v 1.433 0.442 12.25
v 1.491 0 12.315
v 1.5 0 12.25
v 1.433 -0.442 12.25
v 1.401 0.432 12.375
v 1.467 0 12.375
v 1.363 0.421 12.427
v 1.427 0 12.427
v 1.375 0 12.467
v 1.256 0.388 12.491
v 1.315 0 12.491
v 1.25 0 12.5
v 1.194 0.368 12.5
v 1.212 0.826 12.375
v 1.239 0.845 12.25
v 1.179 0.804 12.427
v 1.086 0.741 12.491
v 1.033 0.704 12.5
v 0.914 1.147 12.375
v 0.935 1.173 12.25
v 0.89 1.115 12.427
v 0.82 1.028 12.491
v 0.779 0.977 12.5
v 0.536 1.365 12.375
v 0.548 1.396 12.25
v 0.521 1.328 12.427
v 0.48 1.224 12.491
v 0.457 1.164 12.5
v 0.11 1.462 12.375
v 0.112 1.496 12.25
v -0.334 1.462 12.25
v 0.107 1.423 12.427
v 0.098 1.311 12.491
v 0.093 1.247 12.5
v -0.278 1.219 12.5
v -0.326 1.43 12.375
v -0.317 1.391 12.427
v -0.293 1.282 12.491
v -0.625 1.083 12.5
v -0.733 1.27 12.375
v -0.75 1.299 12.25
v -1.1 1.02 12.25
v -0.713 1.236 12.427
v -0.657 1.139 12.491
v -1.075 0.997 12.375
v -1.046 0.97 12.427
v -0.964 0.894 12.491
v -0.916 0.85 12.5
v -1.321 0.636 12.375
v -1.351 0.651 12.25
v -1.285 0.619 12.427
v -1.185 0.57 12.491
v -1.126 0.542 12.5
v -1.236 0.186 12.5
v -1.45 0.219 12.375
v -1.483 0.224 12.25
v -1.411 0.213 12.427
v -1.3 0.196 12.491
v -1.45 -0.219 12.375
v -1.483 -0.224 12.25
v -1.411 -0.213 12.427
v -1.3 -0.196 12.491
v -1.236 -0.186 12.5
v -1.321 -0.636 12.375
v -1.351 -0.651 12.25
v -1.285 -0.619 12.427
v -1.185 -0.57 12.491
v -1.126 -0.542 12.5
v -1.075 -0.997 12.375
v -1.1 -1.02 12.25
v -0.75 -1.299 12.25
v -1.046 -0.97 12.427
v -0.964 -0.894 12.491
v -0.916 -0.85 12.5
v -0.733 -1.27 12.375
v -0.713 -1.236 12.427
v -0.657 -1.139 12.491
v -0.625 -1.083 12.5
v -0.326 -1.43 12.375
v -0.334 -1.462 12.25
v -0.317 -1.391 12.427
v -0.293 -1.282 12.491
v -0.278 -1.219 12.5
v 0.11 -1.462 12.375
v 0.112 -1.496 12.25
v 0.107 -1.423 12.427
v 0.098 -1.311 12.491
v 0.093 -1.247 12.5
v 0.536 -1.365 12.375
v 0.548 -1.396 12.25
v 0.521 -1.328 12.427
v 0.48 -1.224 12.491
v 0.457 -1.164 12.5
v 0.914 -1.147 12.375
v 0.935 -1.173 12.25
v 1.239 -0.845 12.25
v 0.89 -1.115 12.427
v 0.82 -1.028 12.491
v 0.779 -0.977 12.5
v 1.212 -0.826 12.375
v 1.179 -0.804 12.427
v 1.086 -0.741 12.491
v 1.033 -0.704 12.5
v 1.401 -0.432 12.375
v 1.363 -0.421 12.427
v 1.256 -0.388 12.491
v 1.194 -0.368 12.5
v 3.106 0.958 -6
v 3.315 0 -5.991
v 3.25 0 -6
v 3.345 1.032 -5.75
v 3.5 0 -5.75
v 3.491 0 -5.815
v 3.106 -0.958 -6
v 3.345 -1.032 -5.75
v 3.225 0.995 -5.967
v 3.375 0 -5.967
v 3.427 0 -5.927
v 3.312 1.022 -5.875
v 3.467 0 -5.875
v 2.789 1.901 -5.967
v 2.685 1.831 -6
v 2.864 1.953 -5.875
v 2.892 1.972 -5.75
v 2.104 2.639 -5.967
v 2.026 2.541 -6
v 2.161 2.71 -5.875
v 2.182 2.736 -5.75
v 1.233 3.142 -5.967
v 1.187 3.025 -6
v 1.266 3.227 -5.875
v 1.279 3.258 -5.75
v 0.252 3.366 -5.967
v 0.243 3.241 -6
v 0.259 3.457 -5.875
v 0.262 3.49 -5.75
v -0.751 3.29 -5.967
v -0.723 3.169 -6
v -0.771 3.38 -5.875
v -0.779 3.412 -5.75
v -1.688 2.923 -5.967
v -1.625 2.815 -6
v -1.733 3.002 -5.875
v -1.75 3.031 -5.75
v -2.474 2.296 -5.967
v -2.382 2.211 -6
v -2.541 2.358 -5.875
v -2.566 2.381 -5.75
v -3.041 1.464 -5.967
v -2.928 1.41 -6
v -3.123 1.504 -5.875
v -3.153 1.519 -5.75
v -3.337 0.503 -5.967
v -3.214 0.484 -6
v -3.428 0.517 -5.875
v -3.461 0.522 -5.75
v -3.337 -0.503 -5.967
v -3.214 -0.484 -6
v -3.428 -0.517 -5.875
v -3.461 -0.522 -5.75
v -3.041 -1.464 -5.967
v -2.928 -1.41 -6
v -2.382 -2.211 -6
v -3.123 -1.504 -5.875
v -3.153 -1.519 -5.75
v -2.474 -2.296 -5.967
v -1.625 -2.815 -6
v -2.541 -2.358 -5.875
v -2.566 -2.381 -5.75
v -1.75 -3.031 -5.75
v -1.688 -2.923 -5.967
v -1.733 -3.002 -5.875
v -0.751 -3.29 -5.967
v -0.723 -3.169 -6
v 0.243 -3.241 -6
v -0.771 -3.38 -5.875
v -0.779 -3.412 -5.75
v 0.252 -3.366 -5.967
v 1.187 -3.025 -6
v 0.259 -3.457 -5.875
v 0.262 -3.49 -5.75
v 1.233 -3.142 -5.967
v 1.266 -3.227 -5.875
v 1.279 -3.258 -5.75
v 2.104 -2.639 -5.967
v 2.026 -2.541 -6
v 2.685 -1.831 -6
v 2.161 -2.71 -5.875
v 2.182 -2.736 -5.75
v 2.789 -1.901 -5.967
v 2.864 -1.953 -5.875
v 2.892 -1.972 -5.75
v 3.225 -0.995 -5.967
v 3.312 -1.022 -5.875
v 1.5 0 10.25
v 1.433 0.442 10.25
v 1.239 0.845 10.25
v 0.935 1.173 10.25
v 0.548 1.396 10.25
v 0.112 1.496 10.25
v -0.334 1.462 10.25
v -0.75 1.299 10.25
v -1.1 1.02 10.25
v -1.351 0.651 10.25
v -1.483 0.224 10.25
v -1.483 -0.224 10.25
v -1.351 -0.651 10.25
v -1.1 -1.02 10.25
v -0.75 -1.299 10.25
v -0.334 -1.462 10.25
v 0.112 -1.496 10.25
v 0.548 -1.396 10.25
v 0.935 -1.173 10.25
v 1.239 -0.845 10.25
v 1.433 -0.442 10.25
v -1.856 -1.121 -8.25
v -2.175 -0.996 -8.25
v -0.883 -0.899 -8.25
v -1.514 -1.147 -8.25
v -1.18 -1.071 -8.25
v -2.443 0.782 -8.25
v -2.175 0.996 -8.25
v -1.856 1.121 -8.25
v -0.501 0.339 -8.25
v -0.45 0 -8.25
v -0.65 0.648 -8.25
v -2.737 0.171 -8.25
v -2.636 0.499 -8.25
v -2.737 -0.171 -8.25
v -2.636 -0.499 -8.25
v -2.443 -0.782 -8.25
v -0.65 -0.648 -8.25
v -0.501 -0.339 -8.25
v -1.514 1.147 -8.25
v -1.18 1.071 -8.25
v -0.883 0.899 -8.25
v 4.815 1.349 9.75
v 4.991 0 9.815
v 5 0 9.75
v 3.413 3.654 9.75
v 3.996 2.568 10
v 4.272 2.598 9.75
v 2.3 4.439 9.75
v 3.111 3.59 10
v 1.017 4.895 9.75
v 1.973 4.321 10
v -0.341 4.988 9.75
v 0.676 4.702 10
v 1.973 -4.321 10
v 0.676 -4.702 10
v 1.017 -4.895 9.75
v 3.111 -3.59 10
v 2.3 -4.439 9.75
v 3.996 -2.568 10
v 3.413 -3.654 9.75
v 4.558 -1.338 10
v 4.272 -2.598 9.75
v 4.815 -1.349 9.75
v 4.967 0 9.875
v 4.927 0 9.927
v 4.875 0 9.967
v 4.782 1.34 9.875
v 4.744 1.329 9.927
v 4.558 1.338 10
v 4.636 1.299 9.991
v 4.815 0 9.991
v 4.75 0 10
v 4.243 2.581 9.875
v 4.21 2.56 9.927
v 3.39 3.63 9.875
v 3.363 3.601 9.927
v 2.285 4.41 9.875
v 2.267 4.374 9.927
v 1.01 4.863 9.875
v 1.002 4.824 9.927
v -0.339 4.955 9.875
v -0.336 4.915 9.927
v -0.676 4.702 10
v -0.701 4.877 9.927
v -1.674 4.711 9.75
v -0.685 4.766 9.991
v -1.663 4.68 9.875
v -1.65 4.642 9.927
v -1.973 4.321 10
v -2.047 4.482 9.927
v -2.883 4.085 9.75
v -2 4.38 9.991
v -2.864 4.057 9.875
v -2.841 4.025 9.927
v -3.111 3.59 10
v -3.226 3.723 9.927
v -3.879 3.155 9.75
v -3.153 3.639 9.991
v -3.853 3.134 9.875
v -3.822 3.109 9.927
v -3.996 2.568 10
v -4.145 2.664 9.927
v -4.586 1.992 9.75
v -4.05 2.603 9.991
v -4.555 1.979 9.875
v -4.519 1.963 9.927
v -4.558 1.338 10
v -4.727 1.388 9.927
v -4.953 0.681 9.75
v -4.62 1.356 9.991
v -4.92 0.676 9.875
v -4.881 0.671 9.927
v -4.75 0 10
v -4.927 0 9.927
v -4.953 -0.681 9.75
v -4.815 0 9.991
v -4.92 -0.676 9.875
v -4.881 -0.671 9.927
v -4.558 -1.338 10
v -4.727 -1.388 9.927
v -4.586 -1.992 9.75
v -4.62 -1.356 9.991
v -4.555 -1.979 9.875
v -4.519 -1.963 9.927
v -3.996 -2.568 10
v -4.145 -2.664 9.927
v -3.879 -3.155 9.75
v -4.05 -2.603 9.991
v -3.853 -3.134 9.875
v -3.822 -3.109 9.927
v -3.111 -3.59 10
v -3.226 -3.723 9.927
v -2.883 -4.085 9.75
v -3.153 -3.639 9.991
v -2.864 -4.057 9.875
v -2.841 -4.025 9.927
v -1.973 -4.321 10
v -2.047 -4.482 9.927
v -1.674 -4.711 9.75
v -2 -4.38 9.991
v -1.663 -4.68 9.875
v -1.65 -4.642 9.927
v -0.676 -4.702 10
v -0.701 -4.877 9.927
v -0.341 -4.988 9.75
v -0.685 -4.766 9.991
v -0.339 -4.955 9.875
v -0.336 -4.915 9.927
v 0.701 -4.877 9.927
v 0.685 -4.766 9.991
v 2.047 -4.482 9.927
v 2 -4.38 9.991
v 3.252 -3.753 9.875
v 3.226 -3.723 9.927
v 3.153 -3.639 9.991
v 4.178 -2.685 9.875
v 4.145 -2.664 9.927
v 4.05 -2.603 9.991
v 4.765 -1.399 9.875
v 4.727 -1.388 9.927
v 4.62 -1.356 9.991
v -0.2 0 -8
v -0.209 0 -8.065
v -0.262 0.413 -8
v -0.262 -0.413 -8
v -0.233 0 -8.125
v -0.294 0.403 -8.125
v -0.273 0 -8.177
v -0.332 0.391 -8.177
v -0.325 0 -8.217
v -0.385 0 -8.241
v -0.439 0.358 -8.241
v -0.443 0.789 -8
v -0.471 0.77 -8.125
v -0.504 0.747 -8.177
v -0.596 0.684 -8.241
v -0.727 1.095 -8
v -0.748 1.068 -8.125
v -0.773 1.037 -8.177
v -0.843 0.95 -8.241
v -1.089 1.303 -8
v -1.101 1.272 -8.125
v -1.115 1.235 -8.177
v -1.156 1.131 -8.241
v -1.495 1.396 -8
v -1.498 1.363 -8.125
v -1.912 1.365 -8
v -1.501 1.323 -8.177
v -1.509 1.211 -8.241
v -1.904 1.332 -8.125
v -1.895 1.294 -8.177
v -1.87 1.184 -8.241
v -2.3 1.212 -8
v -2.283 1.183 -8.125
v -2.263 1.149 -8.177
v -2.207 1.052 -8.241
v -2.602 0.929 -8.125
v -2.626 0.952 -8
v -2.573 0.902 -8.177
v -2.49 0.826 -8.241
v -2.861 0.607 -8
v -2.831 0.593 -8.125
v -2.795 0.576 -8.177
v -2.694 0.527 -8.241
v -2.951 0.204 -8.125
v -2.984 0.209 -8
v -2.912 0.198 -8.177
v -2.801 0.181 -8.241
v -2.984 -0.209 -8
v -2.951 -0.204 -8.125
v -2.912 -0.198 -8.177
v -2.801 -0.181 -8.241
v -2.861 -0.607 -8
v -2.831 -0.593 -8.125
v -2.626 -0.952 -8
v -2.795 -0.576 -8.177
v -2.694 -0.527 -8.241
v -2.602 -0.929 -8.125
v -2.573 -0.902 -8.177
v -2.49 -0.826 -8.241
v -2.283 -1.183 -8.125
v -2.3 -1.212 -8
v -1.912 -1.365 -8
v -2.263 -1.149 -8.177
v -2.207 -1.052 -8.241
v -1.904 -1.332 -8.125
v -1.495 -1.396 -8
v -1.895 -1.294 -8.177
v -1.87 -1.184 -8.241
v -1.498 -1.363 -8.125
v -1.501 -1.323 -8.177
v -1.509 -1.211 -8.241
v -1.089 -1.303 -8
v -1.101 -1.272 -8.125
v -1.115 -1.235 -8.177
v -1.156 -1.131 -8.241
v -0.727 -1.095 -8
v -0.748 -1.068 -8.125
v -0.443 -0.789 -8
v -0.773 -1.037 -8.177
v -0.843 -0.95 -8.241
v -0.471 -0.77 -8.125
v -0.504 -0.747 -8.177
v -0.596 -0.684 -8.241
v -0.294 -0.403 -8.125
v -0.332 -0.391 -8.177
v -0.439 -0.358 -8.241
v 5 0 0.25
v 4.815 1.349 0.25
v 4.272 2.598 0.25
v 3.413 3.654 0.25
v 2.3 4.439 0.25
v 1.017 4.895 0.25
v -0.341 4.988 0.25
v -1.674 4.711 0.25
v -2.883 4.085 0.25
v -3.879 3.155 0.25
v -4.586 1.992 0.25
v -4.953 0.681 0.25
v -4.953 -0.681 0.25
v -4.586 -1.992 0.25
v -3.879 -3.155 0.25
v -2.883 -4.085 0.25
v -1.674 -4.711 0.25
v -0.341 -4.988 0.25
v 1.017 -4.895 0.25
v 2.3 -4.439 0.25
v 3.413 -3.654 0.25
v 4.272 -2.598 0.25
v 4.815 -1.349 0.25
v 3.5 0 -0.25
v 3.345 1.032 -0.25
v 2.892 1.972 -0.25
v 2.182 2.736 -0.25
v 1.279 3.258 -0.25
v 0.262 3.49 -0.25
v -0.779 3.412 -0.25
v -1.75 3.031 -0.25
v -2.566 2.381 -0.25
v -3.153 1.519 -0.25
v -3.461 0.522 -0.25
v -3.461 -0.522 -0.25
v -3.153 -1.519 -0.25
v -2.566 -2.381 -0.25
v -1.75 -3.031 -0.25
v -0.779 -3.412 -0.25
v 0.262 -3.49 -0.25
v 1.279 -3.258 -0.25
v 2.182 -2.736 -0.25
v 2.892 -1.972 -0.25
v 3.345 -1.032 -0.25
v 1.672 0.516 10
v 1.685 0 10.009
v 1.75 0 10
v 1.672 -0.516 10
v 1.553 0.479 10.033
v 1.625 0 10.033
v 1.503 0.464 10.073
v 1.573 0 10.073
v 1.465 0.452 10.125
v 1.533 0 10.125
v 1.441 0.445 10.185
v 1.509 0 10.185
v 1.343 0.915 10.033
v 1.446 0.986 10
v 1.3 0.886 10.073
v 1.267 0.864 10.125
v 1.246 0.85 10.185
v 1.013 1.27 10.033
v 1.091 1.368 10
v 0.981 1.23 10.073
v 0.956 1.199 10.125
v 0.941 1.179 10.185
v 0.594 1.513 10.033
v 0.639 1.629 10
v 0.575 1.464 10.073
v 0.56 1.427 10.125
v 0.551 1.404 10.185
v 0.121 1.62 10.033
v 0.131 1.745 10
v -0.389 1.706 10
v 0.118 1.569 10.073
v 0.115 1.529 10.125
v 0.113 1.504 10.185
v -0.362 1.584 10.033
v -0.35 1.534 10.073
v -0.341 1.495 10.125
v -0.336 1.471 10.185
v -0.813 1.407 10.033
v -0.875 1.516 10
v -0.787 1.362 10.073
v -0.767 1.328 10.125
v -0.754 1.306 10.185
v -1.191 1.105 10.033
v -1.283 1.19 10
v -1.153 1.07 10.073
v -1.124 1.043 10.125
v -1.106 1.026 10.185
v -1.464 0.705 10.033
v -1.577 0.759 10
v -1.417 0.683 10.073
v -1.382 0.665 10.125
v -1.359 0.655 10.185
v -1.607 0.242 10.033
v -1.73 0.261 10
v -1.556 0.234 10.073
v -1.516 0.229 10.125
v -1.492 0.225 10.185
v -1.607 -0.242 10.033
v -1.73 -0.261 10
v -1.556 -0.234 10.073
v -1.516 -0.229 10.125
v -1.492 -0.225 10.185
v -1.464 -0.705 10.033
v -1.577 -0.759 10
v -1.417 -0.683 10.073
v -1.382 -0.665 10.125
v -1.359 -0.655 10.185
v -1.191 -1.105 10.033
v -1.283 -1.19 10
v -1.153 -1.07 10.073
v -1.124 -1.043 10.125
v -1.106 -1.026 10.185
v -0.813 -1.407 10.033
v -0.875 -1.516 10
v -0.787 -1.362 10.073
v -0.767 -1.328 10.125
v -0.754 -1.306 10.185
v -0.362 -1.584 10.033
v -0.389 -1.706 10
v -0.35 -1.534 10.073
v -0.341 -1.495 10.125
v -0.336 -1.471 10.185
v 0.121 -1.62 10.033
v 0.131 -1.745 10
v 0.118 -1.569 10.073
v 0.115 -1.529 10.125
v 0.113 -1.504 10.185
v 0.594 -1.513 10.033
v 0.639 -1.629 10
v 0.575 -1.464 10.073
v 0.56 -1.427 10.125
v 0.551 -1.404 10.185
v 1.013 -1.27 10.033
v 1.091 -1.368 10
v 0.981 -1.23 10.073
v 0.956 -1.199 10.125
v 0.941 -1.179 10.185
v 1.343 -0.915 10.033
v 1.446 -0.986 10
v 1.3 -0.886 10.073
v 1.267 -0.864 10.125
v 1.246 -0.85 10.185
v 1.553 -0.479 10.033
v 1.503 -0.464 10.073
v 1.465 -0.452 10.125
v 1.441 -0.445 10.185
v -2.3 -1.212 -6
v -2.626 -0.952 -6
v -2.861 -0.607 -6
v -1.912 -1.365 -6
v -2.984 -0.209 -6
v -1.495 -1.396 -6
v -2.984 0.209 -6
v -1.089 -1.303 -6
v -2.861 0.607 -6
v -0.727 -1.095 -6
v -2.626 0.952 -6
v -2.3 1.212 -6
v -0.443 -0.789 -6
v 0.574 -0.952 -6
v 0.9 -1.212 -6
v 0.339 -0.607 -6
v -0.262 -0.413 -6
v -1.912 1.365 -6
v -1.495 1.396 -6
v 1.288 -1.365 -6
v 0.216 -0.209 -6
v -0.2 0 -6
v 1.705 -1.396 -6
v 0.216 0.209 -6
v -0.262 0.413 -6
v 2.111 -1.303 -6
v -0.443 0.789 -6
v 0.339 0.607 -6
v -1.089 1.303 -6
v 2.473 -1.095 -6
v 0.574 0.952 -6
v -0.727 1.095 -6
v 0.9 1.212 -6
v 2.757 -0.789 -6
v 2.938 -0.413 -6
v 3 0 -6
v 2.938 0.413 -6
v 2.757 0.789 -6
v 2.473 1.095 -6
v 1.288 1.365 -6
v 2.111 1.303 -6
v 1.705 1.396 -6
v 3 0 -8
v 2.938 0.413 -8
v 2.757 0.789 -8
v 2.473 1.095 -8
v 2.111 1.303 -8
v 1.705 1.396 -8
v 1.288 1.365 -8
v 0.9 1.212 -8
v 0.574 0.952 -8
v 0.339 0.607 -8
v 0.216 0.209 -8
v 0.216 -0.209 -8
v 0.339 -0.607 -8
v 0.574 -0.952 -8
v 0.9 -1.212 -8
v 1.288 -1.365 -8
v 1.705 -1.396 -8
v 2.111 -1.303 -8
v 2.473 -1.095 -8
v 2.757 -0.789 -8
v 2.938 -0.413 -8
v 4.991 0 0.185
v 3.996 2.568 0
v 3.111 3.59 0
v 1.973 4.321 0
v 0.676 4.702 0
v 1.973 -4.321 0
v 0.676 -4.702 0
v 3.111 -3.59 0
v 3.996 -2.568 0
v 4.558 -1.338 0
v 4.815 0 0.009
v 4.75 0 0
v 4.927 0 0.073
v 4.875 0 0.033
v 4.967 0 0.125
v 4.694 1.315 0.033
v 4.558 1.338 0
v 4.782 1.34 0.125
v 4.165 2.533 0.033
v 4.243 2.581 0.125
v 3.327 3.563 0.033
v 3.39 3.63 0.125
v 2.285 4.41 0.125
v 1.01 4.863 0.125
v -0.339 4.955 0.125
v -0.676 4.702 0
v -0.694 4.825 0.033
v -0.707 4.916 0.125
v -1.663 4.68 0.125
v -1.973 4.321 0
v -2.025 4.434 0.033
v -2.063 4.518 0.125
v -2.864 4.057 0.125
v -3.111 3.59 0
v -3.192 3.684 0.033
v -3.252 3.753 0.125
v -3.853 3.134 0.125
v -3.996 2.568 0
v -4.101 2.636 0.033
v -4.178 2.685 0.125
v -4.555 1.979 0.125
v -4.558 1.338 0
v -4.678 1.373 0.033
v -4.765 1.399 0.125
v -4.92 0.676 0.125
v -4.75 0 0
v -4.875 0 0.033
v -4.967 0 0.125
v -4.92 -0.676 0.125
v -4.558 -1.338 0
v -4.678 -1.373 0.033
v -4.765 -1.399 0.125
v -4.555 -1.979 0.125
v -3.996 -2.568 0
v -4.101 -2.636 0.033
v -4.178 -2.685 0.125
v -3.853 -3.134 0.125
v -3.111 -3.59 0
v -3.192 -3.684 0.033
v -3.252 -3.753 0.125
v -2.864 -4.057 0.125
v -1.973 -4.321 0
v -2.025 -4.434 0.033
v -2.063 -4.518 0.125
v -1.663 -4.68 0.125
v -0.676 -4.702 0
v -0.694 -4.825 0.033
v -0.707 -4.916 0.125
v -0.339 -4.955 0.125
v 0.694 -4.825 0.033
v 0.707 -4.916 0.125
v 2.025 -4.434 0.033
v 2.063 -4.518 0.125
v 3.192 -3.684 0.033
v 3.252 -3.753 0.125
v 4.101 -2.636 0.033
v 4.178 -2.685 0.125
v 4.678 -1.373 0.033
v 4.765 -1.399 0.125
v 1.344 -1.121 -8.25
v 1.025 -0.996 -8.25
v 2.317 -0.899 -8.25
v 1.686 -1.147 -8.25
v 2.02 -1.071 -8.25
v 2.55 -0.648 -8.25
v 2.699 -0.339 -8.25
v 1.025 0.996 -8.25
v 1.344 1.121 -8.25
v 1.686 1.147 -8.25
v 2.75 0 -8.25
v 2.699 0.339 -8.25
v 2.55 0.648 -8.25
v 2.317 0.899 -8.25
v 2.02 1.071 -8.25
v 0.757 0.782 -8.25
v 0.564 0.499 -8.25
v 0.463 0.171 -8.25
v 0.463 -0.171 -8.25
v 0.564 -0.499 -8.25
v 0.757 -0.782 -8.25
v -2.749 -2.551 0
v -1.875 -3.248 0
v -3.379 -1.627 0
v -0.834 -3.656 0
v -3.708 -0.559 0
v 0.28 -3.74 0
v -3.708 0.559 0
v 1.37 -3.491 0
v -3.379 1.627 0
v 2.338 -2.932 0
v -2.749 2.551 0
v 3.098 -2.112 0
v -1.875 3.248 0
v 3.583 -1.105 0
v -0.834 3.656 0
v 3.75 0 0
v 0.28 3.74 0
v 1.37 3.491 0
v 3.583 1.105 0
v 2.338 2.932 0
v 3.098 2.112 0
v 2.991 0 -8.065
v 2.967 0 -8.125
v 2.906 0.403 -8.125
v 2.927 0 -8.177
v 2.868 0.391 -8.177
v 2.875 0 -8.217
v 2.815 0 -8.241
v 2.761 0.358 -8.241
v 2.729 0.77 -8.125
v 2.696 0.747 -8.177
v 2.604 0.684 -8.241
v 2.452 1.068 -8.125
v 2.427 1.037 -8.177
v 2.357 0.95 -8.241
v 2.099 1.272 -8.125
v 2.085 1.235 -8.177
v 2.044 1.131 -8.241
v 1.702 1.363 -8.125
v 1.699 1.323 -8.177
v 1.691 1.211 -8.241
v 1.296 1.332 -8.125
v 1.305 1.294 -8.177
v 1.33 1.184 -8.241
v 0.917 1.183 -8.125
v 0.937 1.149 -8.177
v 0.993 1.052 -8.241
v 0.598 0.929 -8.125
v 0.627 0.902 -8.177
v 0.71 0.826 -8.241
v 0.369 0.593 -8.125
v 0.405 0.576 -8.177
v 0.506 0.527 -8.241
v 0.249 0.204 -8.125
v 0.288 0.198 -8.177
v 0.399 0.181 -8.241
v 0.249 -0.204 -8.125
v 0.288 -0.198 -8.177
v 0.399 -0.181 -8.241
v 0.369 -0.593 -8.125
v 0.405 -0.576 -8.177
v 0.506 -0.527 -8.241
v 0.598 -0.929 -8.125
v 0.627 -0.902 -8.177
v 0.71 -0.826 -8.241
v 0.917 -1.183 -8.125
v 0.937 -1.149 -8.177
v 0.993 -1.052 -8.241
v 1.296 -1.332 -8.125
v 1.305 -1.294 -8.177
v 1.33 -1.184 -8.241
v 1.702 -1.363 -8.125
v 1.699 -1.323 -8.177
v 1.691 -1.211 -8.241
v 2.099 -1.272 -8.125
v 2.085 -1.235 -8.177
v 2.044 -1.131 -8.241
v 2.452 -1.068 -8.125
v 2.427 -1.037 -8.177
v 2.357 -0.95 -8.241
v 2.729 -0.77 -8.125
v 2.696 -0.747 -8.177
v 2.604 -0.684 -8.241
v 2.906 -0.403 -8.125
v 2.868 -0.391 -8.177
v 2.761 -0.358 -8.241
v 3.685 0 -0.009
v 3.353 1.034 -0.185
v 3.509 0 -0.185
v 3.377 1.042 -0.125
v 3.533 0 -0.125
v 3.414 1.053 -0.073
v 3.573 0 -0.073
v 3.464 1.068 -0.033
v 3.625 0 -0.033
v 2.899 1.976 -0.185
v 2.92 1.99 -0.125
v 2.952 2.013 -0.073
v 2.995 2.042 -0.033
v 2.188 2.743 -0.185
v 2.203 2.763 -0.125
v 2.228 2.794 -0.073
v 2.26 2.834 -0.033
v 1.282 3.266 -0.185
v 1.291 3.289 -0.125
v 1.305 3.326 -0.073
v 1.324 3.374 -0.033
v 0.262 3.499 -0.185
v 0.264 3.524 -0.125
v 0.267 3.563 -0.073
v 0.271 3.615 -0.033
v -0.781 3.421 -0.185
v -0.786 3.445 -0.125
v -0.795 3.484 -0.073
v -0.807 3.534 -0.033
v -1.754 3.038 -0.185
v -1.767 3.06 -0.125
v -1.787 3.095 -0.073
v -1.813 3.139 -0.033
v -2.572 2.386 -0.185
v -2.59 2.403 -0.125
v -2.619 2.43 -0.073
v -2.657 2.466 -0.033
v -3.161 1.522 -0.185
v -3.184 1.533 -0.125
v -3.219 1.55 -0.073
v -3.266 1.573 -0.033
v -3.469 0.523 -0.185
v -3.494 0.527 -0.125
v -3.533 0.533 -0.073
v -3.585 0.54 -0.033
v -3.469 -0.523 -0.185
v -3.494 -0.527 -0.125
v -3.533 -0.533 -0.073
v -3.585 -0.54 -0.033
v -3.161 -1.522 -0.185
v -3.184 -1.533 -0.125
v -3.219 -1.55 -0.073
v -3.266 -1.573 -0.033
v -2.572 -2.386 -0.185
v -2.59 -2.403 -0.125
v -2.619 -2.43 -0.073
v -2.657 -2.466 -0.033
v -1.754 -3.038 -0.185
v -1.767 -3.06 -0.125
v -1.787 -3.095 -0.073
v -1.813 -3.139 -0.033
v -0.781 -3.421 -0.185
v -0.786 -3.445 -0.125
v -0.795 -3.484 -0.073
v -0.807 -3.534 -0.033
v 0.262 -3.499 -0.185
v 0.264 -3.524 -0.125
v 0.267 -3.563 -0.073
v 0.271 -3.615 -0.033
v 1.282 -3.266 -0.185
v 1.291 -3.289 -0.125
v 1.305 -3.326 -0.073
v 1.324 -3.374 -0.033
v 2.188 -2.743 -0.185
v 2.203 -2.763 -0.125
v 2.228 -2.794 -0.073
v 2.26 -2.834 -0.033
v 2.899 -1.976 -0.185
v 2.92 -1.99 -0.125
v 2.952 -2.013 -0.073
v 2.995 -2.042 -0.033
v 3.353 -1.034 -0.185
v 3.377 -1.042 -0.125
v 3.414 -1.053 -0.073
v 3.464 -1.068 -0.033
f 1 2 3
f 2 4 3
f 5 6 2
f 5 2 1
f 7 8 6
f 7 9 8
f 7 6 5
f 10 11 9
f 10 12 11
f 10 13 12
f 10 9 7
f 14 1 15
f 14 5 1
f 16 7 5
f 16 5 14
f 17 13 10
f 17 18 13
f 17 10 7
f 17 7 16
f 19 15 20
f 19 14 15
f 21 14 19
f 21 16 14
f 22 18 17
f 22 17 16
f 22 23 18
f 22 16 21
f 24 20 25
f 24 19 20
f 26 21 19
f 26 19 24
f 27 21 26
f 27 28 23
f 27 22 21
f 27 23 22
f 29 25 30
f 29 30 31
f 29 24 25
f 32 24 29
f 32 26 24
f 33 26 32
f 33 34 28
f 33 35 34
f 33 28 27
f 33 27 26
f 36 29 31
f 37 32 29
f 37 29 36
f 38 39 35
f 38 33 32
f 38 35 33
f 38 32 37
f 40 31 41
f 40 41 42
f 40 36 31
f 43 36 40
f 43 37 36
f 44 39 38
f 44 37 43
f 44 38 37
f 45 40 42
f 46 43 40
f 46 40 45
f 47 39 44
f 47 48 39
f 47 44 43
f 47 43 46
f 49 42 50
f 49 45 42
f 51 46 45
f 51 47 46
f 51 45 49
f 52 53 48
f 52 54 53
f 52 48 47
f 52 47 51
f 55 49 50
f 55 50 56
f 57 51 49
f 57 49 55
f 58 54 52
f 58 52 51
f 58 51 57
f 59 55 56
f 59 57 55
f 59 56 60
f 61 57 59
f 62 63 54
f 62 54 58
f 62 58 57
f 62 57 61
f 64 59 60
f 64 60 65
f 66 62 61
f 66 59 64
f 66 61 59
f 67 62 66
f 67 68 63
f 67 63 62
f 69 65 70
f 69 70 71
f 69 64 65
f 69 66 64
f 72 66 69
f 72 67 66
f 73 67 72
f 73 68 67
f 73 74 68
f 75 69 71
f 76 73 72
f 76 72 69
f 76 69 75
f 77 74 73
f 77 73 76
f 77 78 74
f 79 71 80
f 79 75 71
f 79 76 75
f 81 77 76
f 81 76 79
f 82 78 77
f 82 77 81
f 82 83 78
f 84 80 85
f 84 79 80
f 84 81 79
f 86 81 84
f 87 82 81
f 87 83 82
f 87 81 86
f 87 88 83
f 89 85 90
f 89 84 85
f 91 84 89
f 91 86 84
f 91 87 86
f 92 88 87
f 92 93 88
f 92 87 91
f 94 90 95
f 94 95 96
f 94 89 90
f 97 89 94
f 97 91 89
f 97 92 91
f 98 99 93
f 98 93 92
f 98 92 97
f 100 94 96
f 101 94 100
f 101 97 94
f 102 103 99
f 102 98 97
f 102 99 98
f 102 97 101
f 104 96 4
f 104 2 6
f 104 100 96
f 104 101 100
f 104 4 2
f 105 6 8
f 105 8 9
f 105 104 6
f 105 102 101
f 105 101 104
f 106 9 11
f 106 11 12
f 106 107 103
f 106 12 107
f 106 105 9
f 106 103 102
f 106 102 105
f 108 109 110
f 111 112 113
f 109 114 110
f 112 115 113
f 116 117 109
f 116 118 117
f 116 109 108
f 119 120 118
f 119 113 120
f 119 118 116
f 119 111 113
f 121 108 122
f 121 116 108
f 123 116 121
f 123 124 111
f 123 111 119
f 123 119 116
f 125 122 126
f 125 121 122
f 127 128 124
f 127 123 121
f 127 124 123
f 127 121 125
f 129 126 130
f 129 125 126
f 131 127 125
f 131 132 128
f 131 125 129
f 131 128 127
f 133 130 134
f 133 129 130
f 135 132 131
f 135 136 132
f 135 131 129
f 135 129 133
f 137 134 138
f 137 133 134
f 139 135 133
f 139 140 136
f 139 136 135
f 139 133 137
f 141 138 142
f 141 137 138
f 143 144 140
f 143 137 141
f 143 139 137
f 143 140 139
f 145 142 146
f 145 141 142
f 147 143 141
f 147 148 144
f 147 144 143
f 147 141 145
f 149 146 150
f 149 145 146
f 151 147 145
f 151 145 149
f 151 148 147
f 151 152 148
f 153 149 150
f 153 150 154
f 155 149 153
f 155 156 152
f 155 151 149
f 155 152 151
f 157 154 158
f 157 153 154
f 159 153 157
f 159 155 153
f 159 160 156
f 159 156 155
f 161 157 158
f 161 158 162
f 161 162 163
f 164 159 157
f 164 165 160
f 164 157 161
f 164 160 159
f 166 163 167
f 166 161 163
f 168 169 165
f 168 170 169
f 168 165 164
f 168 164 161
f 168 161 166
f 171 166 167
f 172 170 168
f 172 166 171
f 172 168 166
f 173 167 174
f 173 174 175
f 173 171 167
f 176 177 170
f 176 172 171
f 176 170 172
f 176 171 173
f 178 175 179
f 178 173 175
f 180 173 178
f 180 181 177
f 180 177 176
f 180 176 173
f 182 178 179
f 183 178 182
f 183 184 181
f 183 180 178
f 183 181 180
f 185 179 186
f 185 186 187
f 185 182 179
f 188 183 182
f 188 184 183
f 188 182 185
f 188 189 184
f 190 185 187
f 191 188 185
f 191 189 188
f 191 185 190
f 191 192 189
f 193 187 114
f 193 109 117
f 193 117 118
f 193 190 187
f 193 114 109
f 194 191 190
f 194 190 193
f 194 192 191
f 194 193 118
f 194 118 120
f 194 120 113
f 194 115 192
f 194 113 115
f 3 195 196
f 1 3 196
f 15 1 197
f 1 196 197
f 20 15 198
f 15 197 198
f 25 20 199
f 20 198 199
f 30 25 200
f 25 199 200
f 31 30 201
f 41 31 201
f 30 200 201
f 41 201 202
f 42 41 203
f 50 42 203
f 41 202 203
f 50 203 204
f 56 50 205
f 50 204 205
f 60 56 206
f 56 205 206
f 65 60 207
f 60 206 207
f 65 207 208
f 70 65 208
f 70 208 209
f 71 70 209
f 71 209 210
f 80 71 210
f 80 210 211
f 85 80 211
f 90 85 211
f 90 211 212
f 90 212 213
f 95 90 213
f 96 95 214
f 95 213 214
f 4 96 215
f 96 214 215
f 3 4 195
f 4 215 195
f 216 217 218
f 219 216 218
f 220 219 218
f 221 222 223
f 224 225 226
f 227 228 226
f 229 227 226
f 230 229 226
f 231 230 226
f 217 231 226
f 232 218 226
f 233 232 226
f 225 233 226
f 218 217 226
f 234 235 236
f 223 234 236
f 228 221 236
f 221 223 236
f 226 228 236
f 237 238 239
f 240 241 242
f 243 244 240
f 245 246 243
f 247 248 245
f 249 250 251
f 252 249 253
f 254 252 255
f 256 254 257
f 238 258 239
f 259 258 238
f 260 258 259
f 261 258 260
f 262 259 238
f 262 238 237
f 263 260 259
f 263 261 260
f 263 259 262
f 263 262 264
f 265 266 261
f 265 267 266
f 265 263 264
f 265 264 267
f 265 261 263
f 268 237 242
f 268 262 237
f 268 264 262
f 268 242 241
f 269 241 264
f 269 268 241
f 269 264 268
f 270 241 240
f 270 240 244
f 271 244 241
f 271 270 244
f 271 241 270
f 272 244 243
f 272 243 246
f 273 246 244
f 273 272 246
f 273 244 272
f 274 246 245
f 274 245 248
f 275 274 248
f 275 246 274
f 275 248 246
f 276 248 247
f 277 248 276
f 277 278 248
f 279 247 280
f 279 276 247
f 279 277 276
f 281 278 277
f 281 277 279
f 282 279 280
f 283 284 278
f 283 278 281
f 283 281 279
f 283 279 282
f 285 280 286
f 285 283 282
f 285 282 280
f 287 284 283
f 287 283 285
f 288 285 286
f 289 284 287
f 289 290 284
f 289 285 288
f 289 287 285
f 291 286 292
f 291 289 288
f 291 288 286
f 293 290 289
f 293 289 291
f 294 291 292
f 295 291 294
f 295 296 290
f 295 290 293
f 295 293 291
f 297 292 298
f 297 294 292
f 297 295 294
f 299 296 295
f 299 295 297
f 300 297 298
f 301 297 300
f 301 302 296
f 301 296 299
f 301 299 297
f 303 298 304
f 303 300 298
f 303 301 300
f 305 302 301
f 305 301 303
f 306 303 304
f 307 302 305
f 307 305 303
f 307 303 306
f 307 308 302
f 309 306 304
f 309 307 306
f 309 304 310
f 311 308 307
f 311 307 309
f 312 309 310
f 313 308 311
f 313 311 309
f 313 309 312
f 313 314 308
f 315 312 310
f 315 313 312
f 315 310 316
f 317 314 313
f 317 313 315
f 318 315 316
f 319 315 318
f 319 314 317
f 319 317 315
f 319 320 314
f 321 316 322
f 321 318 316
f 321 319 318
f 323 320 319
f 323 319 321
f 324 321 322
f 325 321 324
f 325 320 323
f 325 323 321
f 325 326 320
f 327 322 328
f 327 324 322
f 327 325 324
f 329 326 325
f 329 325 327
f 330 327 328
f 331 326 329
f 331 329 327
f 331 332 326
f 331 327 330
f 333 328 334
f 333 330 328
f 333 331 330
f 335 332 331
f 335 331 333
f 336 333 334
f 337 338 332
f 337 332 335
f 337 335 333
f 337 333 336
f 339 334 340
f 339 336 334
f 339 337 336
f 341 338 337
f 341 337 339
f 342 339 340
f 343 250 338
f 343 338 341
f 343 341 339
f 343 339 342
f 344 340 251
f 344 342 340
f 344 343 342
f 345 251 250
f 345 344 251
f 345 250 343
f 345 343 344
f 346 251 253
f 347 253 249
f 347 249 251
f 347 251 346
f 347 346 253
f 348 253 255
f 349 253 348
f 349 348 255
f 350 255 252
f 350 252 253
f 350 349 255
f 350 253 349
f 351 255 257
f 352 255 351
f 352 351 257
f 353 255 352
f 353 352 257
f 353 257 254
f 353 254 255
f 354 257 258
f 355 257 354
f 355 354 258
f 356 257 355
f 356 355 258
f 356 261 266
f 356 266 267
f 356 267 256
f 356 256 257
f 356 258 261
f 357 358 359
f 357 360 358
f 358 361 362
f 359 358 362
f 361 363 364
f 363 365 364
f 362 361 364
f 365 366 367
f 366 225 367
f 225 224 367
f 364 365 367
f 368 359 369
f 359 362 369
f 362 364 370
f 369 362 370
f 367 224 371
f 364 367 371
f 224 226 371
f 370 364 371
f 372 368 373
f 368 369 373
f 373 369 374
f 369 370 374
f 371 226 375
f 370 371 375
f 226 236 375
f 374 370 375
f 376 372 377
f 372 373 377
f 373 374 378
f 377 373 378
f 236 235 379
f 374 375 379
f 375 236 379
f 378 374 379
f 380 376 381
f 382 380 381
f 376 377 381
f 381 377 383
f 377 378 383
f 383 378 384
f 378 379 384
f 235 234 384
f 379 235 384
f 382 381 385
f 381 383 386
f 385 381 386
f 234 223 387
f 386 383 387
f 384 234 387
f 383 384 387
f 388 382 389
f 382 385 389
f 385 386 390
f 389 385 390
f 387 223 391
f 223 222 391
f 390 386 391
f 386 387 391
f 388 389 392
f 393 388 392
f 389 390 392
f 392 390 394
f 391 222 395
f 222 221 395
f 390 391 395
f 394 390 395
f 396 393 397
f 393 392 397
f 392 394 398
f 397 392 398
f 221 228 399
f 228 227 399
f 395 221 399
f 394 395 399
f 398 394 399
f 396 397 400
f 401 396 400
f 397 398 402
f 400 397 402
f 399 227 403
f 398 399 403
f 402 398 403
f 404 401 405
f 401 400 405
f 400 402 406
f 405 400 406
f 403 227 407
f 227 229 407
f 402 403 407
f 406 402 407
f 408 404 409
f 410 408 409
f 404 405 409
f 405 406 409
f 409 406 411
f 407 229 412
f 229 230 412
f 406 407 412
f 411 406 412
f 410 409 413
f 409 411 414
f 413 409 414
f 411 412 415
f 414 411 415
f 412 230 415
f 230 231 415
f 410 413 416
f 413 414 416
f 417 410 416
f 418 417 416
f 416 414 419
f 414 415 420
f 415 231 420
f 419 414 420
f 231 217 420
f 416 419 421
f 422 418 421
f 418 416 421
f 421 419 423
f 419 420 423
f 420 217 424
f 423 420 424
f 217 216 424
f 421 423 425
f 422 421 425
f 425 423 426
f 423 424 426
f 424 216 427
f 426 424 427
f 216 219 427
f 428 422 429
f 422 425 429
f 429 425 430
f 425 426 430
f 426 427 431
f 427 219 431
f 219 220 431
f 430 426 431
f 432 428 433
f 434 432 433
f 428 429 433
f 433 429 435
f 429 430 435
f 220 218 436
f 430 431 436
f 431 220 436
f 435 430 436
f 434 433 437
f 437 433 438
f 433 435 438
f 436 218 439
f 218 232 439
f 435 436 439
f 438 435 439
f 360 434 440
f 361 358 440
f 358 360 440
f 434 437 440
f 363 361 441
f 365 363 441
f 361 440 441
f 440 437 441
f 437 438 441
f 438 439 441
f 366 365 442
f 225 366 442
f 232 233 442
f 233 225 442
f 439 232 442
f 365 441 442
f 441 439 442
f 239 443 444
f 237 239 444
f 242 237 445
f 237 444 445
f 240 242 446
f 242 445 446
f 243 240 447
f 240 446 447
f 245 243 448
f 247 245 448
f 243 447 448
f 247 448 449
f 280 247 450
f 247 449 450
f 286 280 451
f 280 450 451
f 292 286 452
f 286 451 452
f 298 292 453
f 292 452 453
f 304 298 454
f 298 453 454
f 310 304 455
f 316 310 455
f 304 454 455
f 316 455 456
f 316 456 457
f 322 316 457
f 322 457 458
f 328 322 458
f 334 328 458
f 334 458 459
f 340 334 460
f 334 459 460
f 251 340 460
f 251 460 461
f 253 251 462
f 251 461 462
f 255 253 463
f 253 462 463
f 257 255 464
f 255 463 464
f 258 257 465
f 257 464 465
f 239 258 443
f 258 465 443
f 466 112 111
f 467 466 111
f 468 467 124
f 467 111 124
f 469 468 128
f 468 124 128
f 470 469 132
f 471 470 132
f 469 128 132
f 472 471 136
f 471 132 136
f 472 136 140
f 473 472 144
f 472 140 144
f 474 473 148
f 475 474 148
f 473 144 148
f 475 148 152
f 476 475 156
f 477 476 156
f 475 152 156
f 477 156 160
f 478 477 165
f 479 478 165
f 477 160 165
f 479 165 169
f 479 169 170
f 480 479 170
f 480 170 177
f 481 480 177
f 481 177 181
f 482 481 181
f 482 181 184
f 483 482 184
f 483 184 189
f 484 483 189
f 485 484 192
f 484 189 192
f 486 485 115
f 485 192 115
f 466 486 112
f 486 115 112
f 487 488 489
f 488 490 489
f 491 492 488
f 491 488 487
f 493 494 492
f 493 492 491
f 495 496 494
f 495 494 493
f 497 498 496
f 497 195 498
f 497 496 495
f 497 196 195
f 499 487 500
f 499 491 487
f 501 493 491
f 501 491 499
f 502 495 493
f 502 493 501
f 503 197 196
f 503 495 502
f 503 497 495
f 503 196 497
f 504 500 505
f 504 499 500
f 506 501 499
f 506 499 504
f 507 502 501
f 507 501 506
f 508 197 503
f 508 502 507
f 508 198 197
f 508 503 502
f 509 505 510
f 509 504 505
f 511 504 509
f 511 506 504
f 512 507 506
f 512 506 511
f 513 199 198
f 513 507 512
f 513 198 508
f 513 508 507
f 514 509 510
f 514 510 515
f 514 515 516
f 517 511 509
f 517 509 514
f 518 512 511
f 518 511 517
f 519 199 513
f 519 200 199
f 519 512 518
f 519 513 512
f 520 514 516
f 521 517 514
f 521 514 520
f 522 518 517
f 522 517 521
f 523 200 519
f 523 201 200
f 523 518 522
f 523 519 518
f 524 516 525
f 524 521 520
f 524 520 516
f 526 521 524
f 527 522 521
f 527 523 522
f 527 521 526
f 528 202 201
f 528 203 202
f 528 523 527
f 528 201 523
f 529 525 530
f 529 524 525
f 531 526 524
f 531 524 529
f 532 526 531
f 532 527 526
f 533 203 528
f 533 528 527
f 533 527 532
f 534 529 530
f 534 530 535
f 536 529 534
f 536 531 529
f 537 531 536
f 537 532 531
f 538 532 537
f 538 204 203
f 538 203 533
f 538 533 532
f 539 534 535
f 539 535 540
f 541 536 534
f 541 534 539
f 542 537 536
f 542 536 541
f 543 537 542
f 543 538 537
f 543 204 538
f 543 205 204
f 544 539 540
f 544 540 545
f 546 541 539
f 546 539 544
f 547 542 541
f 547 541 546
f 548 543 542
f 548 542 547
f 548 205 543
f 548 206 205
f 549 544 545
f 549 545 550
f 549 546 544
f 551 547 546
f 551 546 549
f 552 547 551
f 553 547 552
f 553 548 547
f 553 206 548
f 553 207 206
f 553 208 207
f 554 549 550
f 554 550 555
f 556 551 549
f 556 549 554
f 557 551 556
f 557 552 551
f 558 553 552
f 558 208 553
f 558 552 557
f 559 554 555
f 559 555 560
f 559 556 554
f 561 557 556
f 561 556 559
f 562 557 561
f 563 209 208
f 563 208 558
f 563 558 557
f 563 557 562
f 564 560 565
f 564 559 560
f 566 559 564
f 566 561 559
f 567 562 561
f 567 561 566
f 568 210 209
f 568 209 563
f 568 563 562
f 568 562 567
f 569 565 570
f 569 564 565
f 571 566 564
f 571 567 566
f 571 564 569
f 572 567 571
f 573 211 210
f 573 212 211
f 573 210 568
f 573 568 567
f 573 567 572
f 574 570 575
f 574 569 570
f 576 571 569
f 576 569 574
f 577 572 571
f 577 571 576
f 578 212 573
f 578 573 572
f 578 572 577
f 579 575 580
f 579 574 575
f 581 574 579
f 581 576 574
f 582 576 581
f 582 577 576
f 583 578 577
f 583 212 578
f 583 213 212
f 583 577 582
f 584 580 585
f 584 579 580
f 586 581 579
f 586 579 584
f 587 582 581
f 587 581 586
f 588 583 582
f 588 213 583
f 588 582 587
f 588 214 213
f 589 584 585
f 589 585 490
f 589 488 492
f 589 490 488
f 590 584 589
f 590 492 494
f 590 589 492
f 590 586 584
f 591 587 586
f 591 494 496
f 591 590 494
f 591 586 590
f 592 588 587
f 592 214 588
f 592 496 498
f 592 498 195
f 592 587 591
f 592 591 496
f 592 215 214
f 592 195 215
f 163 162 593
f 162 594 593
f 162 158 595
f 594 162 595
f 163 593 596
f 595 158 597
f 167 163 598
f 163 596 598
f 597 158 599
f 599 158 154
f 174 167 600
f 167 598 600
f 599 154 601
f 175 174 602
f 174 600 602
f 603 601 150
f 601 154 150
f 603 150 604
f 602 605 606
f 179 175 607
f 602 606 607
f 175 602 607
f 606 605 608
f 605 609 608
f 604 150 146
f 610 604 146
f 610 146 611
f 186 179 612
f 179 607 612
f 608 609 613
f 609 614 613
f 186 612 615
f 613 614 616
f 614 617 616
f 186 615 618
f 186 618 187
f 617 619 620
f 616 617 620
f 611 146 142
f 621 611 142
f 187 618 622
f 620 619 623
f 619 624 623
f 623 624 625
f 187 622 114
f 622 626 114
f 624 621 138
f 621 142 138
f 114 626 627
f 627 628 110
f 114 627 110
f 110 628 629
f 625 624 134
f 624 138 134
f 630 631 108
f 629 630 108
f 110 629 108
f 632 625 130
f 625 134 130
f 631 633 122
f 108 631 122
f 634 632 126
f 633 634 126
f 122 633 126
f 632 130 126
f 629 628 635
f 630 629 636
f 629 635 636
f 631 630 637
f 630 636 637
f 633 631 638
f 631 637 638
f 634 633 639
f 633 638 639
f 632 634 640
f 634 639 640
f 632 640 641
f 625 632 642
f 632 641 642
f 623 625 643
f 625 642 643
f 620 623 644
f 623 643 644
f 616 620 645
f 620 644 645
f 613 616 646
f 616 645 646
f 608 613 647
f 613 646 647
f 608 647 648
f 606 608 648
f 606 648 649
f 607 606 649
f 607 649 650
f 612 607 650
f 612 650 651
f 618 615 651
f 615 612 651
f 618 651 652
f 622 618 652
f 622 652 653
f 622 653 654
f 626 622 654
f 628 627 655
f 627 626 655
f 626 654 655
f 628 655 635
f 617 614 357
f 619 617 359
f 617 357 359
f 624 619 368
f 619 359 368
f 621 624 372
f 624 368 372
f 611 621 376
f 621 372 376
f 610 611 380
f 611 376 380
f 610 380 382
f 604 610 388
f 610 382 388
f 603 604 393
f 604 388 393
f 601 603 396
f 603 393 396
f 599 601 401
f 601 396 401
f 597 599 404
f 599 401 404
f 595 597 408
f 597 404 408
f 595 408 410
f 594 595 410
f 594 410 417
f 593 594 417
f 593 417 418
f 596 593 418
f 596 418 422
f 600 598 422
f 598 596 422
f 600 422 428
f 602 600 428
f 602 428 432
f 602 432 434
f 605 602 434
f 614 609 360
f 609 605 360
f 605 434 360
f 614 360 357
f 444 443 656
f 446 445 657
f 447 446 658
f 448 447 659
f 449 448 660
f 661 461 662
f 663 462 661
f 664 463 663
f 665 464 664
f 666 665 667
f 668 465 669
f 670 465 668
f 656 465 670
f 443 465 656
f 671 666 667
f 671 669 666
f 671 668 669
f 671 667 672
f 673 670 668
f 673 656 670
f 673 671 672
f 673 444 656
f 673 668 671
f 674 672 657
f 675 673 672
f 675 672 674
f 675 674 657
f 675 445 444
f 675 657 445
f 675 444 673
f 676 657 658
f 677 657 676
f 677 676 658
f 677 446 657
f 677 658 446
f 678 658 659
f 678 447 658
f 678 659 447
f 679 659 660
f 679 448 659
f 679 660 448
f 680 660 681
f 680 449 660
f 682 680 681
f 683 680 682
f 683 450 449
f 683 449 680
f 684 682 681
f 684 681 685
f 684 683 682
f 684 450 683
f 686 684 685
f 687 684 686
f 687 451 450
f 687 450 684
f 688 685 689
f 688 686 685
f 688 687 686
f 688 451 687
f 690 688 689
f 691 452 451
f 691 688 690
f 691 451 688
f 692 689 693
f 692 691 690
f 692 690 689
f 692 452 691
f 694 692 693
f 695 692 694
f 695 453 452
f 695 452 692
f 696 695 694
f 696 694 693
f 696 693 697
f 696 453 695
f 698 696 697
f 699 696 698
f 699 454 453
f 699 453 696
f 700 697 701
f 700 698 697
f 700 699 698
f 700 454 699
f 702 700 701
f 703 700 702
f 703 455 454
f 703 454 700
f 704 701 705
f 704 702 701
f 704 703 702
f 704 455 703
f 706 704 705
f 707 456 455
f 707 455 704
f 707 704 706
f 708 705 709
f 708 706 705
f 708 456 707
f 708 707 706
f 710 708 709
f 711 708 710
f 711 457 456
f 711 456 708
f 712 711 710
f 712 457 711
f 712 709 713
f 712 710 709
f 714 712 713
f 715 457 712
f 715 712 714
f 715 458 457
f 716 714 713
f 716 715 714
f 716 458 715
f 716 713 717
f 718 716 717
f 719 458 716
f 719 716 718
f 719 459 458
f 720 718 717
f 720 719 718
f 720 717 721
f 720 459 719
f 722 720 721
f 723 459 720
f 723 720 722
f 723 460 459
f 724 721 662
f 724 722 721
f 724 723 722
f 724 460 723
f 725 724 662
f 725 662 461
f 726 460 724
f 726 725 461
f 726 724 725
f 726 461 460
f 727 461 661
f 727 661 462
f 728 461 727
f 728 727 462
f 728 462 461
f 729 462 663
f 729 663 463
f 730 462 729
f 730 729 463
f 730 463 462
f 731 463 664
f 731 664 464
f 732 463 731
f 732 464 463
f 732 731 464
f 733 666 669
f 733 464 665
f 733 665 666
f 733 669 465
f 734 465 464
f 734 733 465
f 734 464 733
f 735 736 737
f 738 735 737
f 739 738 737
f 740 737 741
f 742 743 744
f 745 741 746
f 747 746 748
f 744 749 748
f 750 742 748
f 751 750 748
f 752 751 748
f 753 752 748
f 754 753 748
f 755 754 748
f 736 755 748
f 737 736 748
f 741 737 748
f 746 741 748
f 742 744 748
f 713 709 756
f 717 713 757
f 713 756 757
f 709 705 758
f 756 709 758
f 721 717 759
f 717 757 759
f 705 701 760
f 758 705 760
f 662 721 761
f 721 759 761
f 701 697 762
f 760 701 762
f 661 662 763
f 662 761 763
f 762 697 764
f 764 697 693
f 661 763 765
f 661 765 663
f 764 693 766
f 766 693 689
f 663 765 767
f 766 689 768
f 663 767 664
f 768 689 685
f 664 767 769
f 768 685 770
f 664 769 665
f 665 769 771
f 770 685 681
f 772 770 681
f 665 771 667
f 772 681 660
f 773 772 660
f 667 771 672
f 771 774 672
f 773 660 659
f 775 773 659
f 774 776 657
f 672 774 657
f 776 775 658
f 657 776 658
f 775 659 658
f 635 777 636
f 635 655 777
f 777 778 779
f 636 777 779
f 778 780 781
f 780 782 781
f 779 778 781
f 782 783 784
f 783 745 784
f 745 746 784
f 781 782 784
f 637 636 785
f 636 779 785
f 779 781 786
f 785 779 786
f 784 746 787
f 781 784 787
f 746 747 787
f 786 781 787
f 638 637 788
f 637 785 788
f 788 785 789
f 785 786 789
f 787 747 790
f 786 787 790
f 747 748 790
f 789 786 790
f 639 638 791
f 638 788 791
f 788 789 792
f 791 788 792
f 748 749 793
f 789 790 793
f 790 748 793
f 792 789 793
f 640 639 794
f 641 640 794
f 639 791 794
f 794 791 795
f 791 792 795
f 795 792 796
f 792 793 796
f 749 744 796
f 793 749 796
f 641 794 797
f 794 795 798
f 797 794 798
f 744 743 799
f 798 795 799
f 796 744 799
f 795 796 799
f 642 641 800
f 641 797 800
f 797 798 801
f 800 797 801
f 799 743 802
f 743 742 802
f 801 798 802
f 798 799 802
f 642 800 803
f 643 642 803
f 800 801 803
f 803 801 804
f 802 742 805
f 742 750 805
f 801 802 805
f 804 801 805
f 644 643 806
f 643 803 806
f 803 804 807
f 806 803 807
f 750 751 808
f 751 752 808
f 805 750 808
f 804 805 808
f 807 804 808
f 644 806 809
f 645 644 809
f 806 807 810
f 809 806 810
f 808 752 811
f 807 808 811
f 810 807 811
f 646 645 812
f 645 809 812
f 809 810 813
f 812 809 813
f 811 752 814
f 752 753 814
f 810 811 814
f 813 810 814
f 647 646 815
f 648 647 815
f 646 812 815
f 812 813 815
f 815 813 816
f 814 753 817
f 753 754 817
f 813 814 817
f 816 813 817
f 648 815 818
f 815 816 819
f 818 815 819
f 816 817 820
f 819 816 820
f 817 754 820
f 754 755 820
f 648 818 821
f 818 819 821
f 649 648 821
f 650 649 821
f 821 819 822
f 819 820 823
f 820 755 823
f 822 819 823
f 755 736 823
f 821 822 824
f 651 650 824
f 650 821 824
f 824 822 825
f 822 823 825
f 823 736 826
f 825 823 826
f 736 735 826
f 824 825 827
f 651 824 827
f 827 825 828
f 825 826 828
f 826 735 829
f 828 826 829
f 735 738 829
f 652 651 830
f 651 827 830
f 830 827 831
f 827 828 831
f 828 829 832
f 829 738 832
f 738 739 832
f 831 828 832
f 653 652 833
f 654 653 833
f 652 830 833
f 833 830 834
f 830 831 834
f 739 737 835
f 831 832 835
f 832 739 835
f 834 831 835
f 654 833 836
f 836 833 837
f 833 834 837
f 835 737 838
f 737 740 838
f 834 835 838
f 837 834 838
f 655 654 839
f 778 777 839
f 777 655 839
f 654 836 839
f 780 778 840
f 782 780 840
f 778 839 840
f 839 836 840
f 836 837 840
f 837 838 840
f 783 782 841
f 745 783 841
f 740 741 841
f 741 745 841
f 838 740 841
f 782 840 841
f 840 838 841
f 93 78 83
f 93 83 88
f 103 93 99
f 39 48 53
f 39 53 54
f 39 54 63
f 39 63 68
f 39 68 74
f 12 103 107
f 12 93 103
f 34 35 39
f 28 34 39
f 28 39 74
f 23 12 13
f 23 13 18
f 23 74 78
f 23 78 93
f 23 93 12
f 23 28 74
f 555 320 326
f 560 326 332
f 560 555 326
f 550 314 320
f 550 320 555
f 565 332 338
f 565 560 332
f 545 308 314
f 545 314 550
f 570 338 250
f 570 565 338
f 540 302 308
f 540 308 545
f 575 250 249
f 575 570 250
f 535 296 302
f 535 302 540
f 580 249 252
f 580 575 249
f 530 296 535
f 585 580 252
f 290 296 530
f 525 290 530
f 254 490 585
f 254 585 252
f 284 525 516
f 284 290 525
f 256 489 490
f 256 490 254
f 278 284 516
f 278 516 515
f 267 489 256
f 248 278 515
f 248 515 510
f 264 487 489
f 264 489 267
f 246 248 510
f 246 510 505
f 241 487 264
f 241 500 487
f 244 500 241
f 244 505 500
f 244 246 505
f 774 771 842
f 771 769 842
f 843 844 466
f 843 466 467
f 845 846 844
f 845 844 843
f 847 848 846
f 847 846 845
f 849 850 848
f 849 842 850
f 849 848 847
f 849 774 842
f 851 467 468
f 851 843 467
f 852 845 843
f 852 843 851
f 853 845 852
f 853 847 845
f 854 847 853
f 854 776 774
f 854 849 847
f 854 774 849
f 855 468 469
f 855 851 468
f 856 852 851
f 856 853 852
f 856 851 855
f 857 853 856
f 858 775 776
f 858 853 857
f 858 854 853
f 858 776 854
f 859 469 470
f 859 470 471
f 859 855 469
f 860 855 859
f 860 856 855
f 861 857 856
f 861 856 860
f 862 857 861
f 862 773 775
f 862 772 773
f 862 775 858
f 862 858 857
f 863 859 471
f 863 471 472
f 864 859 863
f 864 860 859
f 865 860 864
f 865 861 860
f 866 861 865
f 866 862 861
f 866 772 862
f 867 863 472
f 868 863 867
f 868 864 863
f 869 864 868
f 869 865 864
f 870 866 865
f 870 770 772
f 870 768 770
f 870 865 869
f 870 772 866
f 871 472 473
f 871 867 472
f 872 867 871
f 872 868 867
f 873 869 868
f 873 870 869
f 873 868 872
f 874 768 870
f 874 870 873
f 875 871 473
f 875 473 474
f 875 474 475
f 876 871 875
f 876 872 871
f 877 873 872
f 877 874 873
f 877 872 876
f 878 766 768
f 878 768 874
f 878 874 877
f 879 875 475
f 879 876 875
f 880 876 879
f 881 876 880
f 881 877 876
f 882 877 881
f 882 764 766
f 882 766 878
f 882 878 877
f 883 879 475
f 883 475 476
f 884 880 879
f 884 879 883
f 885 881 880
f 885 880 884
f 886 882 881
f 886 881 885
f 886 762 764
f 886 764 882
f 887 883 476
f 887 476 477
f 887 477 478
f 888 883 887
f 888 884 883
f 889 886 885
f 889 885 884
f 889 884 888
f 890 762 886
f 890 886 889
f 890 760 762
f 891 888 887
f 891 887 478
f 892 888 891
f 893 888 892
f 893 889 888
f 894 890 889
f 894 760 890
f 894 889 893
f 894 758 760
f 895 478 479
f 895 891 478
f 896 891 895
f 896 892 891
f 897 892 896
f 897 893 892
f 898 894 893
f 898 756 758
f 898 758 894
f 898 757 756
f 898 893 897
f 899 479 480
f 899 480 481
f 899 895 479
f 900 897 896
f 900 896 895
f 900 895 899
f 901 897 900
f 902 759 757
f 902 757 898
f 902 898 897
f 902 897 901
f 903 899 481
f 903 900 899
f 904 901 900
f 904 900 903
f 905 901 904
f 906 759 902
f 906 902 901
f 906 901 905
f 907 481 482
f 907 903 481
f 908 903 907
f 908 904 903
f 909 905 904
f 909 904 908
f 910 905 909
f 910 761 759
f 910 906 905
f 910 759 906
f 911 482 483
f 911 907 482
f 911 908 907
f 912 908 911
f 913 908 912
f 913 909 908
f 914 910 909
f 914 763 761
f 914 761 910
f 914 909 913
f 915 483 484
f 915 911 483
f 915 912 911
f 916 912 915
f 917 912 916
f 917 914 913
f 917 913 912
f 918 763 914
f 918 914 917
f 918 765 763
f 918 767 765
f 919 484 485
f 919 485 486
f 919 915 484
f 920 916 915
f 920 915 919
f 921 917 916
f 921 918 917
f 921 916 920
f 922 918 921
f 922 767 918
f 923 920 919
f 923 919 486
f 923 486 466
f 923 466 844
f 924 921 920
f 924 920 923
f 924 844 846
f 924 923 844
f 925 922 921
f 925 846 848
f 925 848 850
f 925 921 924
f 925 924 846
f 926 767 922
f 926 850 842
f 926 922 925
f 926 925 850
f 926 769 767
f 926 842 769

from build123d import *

# Parameters (mm, degrees)
CYLINDER001_R     = 1.5
CYLINDER001_DEPTH = 2.5
CYLINDER002_R     = 3.5
CYLINDER002_DEPTH = 6
CYLINDER003_R     = 1.4
CYLINDER003_DEPTH = 8.25
CYLINDER004_R     = 1.4
CYLINDER004_DEPTH = 8.25
CYLINDER_R        = 5
CYLINDER_DEPTH    = 10
FILLET_R          = 0.25
FILLET001_R       = 0.25
FILLET002_R       = 0.25
FILLET003_R       = 0.25
FILLET004_R       = 0.25
FILLET005_R       = 0.25
FILLET006_R       = 0.25


with BuildPart() as cylinder001:
    # cylinder001 → cylinder001 (new body)
    with BuildSketch(Plane.XY.offset(10)):
        Circle(CYLINDER001_R)
    extrude(amount=CYLINDER001_DEPTH)


with BuildPart() as cylinder002:
    # cylinder002 → cylinder002 (new body)
    with BuildSketch(Plane.XY.offset(-6)):
        Circle(CYLINDER002_R)
    extrude(amount=CYLINDER002_DEPTH)


with BuildPart() as cylinder003:
    # cylinder003 → cylinder003 (new body)
    with BuildSketch(Plane(origin=(-1.6, 0, -8.25), x_dir=(1, 0, 0), z_dir=(0, 0, 1))):
        Circle(CYLINDER003_R)
    extrude(amount=CYLINDER003_DEPTH)


with BuildPart() as cylinder004:
    # cylinder004 → cylinder004 (new body)
    with BuildSketch(Plane(origin=(1.6, 0, -8.25), x_dir=(1, 0, 0), z_dir=(0, 0, 1))):
        Circle(CYLINDER004_R)
    extrude(amount=CYLINDER004_DEPTH)


with BuildPart() as fillet006:
    # cylinder → cylinder (new body)
    with BuildSketch(Plane.XY):
        Circle(CYLINDER_R)
    extrude(amount=CYLINDER_DEPTH)

    # Group: union cylinder001, cylinder002, cylinder003, cylinder004
    add(cylinder001.part)
    add(cylinder002.part)
    add(cylinder003.part)
    add(cylinder004.part)

    # Fillet
    fillet_edges = [fillet006.edges().sort_by_distance(p)[0] for p in [
        (-3.5, 0, -6),
    ]]
    fillet(fillet_edges, radius=FILLET_R)

    # Fillet001
    fillet001_edges = [fillet006.edges().sort_by_distance(p)[0] for p in [
        (-3, 0, -8.25),
        (0.2, 0, -8.25),
    ]]
    fillet(fillet001_edges, radius=FILLET001_R)

    # Fillet002
    fillet002_edges = [fillet006.edges().sort_by_distance(p)[0] for p in [
        (-3.5, 0, 0),
    ]]
    fillet(fillet002_edges, radius=FILLET002_R)

    # Fillet003
    fillet003_edges = [fillet006.edges().sort_by_distance(p)[0] for p in [
        (-5, 0, 0),
    ]]
    fillet(fillet003_edges, radius=FILLET003_R)

    # Fillet004
    fillet004_edges = [fillet006.edges().sort_by_distance(p)[0] for p in [
        (-5, 0, 10),
    ]]
    fillet(fillet004_edges, radius=FILLET004_R)

    # Fillet005
    fillet005_edges = [fillet006.edges().sort_by_distance(p)[0] for p in [
        (-1.5, 0, 10),
    ]]
    fillet(fillet005_edges, radius=FILLET005_R)

    # Fillet006
    fillet006_edges = [fillet006.edges().sort_by_distance(p)[0] for p in [
        (-1.5, 0, 12.5),
    ]]
    fillet(fillet006_edges, radius=FILLET006_R)


solid = fillet006.part
